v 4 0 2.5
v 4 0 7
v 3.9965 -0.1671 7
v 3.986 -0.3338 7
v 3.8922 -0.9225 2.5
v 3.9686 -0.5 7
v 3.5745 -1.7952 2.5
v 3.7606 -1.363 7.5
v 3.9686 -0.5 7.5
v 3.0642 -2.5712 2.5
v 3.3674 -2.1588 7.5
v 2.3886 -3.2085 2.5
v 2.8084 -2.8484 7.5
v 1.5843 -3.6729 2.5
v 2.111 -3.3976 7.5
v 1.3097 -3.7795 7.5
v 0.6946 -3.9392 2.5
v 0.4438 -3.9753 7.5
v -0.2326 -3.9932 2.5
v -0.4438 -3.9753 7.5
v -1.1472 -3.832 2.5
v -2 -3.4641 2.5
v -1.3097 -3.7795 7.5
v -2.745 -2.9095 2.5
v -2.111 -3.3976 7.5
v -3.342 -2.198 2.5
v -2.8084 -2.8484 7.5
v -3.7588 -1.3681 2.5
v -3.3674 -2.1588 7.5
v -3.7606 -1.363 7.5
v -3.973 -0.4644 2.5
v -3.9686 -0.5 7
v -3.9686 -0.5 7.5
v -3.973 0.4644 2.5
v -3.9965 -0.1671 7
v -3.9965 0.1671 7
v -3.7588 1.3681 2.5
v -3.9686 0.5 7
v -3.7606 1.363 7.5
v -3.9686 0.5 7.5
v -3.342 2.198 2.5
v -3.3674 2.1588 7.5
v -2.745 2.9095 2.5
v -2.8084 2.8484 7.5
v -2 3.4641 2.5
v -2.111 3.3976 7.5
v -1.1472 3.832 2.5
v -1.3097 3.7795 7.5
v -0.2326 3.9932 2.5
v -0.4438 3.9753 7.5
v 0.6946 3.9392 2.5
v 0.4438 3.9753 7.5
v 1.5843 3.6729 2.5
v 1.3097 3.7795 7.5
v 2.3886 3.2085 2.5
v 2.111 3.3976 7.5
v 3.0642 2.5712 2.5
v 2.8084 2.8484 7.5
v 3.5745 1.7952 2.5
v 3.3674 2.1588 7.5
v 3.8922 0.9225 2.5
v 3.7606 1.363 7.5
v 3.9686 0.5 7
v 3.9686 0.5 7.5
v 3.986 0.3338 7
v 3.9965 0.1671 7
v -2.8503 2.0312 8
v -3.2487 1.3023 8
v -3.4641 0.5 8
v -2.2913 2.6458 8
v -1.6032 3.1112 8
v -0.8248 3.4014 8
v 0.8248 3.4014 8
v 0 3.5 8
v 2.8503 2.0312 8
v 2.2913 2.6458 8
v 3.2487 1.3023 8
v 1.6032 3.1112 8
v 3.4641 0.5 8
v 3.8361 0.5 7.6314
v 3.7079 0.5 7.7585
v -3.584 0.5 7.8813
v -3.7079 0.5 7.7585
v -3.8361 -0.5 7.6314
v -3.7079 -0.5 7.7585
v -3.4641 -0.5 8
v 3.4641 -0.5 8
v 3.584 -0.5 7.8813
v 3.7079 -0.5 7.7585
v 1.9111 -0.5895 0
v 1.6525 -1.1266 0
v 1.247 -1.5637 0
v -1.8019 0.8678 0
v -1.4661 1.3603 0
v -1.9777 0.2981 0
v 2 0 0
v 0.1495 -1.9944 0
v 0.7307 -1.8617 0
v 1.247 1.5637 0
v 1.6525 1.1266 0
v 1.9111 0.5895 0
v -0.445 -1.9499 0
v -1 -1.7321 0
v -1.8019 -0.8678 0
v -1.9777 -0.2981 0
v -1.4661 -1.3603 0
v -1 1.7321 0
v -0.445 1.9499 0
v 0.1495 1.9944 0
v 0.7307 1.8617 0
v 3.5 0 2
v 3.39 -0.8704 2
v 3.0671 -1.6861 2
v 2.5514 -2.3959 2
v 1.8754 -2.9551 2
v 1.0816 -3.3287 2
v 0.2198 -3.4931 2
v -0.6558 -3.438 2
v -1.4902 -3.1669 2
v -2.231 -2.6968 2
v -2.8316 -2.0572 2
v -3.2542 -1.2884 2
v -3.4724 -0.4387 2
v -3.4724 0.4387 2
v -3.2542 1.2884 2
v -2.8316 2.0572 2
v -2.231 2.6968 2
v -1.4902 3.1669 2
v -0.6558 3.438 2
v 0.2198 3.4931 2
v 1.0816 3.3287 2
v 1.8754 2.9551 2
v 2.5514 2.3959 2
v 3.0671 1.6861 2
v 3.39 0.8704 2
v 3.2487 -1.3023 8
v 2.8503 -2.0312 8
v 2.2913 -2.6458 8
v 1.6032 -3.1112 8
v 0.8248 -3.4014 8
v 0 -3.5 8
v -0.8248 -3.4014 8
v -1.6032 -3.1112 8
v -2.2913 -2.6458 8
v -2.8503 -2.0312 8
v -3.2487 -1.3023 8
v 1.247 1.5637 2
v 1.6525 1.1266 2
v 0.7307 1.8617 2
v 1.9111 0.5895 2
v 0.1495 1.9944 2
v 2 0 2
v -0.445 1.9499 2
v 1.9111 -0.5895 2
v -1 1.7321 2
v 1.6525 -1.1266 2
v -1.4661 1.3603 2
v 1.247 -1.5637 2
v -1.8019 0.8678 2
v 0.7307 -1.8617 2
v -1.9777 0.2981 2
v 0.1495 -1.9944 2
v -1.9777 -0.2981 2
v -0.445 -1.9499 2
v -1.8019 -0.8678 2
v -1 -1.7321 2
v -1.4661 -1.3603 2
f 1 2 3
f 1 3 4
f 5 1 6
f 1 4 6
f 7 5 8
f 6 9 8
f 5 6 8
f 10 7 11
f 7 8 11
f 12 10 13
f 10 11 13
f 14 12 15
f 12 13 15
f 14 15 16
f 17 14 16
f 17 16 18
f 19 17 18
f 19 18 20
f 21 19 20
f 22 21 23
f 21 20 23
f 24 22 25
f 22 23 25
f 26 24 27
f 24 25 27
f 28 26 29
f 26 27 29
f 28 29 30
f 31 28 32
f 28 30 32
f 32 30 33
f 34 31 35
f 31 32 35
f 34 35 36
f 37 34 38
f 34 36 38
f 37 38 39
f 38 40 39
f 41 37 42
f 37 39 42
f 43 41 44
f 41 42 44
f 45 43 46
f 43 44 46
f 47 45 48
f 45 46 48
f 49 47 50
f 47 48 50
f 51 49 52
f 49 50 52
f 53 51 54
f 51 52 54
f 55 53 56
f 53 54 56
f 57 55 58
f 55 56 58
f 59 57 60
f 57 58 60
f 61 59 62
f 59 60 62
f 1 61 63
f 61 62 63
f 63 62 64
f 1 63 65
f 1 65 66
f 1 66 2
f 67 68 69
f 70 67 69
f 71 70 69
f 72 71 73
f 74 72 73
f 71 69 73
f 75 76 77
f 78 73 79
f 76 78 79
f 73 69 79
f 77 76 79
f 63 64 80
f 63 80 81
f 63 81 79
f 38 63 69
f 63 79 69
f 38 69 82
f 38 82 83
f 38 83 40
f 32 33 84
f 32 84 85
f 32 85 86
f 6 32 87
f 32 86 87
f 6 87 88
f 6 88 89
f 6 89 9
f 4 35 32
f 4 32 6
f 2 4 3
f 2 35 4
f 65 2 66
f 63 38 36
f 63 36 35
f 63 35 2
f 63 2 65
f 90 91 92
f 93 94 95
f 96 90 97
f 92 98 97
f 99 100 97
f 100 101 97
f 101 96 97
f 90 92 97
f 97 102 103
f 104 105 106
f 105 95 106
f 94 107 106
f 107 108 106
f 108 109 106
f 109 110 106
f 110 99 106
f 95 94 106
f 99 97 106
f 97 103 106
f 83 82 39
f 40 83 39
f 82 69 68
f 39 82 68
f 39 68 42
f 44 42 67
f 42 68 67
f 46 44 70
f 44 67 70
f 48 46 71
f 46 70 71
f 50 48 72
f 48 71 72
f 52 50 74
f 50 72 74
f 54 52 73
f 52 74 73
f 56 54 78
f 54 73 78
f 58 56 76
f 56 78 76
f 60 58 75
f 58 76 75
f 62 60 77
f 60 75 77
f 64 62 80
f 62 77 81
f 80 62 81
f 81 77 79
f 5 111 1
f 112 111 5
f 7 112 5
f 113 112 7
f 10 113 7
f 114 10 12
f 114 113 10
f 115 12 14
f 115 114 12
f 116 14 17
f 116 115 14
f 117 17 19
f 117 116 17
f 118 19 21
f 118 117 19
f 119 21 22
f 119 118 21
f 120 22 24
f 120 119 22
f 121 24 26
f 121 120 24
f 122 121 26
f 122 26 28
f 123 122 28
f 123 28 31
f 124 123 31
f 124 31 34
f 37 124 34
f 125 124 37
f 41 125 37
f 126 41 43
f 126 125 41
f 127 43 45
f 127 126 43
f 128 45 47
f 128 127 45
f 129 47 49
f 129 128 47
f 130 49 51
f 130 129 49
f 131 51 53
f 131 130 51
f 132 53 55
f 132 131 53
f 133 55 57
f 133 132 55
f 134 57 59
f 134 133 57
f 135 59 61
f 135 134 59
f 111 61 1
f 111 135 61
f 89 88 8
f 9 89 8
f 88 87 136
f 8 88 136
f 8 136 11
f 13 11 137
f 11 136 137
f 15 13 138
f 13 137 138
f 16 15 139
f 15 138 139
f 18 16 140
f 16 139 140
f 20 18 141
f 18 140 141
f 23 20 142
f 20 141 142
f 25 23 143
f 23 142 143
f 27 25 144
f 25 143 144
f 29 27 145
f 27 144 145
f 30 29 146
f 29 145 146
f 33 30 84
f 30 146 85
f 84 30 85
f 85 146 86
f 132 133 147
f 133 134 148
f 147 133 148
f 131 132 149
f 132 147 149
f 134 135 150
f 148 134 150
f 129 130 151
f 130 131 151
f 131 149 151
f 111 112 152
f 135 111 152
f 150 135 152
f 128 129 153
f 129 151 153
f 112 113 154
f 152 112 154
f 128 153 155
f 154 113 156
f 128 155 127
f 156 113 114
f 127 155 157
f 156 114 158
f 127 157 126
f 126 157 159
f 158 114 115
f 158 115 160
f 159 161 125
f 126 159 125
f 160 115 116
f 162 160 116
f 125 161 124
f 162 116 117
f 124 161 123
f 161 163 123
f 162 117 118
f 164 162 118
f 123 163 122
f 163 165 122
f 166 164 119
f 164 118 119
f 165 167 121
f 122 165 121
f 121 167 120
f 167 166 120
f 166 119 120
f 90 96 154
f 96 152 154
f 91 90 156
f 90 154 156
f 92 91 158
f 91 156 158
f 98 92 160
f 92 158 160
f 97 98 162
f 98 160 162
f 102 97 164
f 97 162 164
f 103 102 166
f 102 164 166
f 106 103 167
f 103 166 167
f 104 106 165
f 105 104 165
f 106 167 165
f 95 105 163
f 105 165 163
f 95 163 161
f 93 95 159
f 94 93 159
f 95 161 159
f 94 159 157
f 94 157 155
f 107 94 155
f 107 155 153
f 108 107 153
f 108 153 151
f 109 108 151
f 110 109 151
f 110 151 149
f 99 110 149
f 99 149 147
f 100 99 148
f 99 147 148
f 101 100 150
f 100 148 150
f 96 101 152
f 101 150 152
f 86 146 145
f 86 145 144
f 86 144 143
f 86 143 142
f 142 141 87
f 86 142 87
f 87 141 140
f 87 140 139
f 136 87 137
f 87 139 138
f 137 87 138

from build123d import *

# Parameters (mm, degrees)
F2_SIZE  = 0.5
F3_SIZE  = 0.5
F5_DEPTH = 1


with BuildPart() as f1:
    # F0 (on Front) → F1 (revolve)
    with BuildSketch(Plane.XZ):
        Polygon((0, 8), (0, 0), (2, 0), (2, 2), (3.9999996265, 2), (3.9999996265, 8), align=None)
    revolve(axis=Axis((0, 0, 4), (0, 0, -1)))

    # F2
    f2_edges = [f1.edges().sort_by_distance(p)[0] for p in [
        (-4, 0, 8),
    ]]
    chamfer(f2_edges, length=F2_SIZE)

    # F3
    f3_edges = [f1.edges().sort_by_distance(p)[0] for p in [
        (-4, 0, 2),
    ]]
    chamfer(f3_edges, length=F3_SIZE)

    # F4 (on face) → F5 (cut)
    with BuildSketch(Plane.XY.offset(8)):
        with BuildLine():
            Line((5, 0.5), (3.4641012378, 0.5))
            ThreePointArc((3.4641012378, 0.5), (3.4910134935, 0.2506435189), (3.4999996265, 0))
            ThreePointArc((3.4999996265, 0), (3.4910134935, -0.2506435189), (3.4641012378, -0.5))
            Line((3.4641012378, -0.5), (5, -0.5))
            Line((5, -0.5), (5, 0))
            Line((5, 0), (5, 0.5))
        make_face()
        with BuildLine():
            ThreePointArc((-3.4641012378, 0.5), (-3.4910134935, 0.2506435189), (-3.4999996265, 0))
            ThreePointArc((-3.4999996265, 0), (-3.4910134935, -0.2506435189), (-3.4641012378, -0.5))
            Line((-3.4641012378, -0.5), (3.4641012378, -0.5))
            ThreePointArc((3.4641012378, -0.5), (3.4910134935, -0.2506435189), (3.4999996265, 0))
            ThreePointArc((3.4999996265, 0), (3.4910134935, 0.2506435189), (3.4641012378, 0.5))
            Line((3.4641012378, 0.5), (-3.4641012378, 0.5))
        make_face()
        with BuildLine():
            ThreePointArc((-3.4641012378, -0.5), (-3.4910134935, -0.2506435189), (-3.4999996265, 0))
            Line((-3.4999996265, 0), (-5, 0))
            Line((-5, 0), (-5, -0.5))
            Line((-5, -0.5), (-3.4641012378, -0.5))
        make_face()
        with BuildLine():
            Line((-5, 0), (-3.4999996265, 0))
            ThreePointArc((-3.4999996265, 0), (-3.4910134935, 0.2506435189), (-3.4641012378, 0.5))
            Line((-3.4641012378, 0.5), (-5, 0.5))
            Line((-5, 0.5), (-5, 0))
        make_face()
    extrude(amount=-F5_DEPTH, mode=Mode.SUBTRACT)


solid = f1.part
